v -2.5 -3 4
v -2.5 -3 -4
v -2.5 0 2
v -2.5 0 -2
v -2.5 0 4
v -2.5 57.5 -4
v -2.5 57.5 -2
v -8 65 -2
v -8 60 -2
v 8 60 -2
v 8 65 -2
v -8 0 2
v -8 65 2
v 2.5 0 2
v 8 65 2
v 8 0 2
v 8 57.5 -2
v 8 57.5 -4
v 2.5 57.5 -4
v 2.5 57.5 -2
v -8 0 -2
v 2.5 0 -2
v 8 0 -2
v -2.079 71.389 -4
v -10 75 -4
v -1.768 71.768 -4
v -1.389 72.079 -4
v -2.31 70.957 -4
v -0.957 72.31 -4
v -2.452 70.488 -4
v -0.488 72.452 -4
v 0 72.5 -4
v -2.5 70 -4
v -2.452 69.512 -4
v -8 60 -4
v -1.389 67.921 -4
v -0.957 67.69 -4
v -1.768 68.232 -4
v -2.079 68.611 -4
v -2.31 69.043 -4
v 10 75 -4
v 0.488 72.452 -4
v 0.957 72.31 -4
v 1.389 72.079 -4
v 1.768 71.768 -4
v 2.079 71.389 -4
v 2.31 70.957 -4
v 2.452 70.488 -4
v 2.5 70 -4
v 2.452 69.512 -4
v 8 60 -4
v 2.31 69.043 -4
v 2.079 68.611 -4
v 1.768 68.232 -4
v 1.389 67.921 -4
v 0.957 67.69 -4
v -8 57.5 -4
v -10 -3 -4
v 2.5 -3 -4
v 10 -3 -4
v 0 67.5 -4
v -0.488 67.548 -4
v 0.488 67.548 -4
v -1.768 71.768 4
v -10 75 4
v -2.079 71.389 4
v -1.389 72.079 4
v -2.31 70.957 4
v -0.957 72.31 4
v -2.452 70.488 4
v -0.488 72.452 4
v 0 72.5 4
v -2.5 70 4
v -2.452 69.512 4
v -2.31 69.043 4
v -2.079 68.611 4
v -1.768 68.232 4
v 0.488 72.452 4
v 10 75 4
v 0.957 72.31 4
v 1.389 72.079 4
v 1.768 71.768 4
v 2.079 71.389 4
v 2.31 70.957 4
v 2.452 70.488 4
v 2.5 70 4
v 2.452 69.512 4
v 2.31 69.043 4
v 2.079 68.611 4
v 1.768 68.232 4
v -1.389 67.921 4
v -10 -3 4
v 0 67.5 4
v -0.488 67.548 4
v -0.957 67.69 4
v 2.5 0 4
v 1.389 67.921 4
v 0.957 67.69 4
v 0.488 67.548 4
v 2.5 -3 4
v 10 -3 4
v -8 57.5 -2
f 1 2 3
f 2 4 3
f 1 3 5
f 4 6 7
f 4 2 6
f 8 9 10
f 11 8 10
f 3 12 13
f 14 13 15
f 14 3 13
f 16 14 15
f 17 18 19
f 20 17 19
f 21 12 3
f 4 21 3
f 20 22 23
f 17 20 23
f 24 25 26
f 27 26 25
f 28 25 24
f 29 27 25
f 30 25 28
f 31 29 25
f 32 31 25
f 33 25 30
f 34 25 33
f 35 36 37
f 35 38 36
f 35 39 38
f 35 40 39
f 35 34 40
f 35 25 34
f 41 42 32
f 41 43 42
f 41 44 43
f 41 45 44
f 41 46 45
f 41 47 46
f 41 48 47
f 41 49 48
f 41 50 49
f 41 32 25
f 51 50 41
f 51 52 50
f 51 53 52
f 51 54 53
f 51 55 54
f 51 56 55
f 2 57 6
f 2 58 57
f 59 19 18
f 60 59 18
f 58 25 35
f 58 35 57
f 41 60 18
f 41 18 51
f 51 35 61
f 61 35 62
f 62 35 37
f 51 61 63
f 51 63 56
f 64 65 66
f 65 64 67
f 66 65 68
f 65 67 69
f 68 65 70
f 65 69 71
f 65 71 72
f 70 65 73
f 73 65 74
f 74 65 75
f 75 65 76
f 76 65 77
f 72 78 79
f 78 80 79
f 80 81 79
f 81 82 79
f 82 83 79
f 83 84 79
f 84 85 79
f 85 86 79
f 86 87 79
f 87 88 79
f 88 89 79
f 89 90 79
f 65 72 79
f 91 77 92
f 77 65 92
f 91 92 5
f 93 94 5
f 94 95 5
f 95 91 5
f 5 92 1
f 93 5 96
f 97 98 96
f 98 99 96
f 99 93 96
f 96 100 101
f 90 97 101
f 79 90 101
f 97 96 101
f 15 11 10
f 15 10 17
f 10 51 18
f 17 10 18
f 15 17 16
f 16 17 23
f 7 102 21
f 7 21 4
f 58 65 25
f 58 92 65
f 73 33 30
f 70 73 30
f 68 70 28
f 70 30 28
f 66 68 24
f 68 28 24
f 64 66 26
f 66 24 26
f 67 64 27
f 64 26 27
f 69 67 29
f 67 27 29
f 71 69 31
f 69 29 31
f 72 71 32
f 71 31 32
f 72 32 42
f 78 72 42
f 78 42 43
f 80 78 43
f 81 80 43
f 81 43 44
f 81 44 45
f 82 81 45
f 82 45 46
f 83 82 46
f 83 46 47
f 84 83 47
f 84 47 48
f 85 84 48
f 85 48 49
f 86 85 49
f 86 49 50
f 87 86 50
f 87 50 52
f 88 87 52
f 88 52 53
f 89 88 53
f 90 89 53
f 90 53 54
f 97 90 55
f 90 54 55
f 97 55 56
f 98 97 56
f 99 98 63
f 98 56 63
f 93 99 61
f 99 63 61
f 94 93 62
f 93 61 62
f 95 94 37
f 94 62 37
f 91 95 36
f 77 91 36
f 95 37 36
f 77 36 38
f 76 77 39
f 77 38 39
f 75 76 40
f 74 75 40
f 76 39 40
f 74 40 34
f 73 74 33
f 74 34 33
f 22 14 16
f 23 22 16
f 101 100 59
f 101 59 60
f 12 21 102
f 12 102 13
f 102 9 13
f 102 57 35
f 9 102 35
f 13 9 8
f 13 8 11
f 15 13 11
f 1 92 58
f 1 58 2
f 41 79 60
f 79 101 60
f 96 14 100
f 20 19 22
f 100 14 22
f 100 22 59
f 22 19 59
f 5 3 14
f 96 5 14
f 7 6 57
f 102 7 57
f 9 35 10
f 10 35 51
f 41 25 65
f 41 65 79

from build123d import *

# Parameters (mm, degrees)
SKETCH2_W               = 20
SKETCH2_H               = 8
SKETCH2_W_2             = 16
SKETCH2_H_2             = 4
BOSS_EXTRUDE2_DEPTH     = 65
CUT_EXTRUDE2_DEPTH      = 2
SKETCH5_W               = 7.5
SKETCH5_H               = 8
BOSS_EXTRUDE3_DEPTH     = 3
SKETCH6_W               = 20
SKETCH6_H               = 8
BOSS_EXTRUDE4_DEPTH     = 10
SKETCH7_R               = 2.5
CUT_EXTRUDE3_DEPTH      = 1
CUT_EXTRUDE3_DEPTH_BACK = 9


with BuildPart() as part:
    # Sketch2 → Boss-Extrude2 (new body)
    with BuildSketch(Plane(origin=(0, 0, 0), x_dir=(1, 0, 0), z_dir=(0, 1, 0))):
        Rectangle(SKETCH2_W, SKETCH2_H)
        Rectangle(SKETCH2_W_2, SKETCH2_H_2, mode=Mode.SUBTRACT)
    extrude(amount=BOSS_EXTRUDE2_DEPTH)

    # Sketch4 → Cut-Extrude2 (cut)
    with BuildSketch(Plane(origin=(0, 0, -4), x_dir=(-1, 0, 0), z_dir=(0, 0, -1))):
        Polygon((8, 60), (-8, 60), (-8, 57.5), (-2.5, 57.5), (-2.5, 0), (2.5, 0), (2.5, 57.5), (8, 57.5), align=None)
    extrude(amount=-CUT_EXTRUDE2_DEPTH, mode=Mode.SUBTRACT)

    # Sketch5 → Boss-Extrude3 (add)
    with BuildSketch(Plane.XZ):
        with Locations((-6.25, 0)):
            Rectangle(SKETCH5_W, SKETCH5_H)
        with Locations((6.25, 0)):
            Rectangle(SKETCH5_W, SKETCH5_H)
    extrude(amount=BOSS_EXTRUDE3_DEPTH)

    # Sketch6 → Boss-Extrude4 (add)
    with BuildSketch(Plane(origin=(0, 65, 0), x_dir=(1, 0, 0), z_dir=(0, 1, 0))):
        Rectangle(SKETCH6_W, SKETCH6_H)
    extrude(amount=BOSS_EXTRUDE4_DEPTH)

    # Sketch7 → Cut-Extrude3 (cut, two sides)
    with BuildSketch(Plane(origin=(0, 0, -4), x_dir=(-1, 0, 0), z_dir=(0, 0, -1))) as cut_extrude3_sk:
        with Locations((0, 70)):
            Circle(SKETCH7_R)
    extrude(amount=CUT_EXTRUDE3_DEPTH, mode=Mode.SUBTRACT)
    extrude(cut_extrude3_sk.sketch, amount=-CUT_EXTRUDE3_DEPTH_BACK, mode=Mode.SUBTRACT)


solid = part.part
